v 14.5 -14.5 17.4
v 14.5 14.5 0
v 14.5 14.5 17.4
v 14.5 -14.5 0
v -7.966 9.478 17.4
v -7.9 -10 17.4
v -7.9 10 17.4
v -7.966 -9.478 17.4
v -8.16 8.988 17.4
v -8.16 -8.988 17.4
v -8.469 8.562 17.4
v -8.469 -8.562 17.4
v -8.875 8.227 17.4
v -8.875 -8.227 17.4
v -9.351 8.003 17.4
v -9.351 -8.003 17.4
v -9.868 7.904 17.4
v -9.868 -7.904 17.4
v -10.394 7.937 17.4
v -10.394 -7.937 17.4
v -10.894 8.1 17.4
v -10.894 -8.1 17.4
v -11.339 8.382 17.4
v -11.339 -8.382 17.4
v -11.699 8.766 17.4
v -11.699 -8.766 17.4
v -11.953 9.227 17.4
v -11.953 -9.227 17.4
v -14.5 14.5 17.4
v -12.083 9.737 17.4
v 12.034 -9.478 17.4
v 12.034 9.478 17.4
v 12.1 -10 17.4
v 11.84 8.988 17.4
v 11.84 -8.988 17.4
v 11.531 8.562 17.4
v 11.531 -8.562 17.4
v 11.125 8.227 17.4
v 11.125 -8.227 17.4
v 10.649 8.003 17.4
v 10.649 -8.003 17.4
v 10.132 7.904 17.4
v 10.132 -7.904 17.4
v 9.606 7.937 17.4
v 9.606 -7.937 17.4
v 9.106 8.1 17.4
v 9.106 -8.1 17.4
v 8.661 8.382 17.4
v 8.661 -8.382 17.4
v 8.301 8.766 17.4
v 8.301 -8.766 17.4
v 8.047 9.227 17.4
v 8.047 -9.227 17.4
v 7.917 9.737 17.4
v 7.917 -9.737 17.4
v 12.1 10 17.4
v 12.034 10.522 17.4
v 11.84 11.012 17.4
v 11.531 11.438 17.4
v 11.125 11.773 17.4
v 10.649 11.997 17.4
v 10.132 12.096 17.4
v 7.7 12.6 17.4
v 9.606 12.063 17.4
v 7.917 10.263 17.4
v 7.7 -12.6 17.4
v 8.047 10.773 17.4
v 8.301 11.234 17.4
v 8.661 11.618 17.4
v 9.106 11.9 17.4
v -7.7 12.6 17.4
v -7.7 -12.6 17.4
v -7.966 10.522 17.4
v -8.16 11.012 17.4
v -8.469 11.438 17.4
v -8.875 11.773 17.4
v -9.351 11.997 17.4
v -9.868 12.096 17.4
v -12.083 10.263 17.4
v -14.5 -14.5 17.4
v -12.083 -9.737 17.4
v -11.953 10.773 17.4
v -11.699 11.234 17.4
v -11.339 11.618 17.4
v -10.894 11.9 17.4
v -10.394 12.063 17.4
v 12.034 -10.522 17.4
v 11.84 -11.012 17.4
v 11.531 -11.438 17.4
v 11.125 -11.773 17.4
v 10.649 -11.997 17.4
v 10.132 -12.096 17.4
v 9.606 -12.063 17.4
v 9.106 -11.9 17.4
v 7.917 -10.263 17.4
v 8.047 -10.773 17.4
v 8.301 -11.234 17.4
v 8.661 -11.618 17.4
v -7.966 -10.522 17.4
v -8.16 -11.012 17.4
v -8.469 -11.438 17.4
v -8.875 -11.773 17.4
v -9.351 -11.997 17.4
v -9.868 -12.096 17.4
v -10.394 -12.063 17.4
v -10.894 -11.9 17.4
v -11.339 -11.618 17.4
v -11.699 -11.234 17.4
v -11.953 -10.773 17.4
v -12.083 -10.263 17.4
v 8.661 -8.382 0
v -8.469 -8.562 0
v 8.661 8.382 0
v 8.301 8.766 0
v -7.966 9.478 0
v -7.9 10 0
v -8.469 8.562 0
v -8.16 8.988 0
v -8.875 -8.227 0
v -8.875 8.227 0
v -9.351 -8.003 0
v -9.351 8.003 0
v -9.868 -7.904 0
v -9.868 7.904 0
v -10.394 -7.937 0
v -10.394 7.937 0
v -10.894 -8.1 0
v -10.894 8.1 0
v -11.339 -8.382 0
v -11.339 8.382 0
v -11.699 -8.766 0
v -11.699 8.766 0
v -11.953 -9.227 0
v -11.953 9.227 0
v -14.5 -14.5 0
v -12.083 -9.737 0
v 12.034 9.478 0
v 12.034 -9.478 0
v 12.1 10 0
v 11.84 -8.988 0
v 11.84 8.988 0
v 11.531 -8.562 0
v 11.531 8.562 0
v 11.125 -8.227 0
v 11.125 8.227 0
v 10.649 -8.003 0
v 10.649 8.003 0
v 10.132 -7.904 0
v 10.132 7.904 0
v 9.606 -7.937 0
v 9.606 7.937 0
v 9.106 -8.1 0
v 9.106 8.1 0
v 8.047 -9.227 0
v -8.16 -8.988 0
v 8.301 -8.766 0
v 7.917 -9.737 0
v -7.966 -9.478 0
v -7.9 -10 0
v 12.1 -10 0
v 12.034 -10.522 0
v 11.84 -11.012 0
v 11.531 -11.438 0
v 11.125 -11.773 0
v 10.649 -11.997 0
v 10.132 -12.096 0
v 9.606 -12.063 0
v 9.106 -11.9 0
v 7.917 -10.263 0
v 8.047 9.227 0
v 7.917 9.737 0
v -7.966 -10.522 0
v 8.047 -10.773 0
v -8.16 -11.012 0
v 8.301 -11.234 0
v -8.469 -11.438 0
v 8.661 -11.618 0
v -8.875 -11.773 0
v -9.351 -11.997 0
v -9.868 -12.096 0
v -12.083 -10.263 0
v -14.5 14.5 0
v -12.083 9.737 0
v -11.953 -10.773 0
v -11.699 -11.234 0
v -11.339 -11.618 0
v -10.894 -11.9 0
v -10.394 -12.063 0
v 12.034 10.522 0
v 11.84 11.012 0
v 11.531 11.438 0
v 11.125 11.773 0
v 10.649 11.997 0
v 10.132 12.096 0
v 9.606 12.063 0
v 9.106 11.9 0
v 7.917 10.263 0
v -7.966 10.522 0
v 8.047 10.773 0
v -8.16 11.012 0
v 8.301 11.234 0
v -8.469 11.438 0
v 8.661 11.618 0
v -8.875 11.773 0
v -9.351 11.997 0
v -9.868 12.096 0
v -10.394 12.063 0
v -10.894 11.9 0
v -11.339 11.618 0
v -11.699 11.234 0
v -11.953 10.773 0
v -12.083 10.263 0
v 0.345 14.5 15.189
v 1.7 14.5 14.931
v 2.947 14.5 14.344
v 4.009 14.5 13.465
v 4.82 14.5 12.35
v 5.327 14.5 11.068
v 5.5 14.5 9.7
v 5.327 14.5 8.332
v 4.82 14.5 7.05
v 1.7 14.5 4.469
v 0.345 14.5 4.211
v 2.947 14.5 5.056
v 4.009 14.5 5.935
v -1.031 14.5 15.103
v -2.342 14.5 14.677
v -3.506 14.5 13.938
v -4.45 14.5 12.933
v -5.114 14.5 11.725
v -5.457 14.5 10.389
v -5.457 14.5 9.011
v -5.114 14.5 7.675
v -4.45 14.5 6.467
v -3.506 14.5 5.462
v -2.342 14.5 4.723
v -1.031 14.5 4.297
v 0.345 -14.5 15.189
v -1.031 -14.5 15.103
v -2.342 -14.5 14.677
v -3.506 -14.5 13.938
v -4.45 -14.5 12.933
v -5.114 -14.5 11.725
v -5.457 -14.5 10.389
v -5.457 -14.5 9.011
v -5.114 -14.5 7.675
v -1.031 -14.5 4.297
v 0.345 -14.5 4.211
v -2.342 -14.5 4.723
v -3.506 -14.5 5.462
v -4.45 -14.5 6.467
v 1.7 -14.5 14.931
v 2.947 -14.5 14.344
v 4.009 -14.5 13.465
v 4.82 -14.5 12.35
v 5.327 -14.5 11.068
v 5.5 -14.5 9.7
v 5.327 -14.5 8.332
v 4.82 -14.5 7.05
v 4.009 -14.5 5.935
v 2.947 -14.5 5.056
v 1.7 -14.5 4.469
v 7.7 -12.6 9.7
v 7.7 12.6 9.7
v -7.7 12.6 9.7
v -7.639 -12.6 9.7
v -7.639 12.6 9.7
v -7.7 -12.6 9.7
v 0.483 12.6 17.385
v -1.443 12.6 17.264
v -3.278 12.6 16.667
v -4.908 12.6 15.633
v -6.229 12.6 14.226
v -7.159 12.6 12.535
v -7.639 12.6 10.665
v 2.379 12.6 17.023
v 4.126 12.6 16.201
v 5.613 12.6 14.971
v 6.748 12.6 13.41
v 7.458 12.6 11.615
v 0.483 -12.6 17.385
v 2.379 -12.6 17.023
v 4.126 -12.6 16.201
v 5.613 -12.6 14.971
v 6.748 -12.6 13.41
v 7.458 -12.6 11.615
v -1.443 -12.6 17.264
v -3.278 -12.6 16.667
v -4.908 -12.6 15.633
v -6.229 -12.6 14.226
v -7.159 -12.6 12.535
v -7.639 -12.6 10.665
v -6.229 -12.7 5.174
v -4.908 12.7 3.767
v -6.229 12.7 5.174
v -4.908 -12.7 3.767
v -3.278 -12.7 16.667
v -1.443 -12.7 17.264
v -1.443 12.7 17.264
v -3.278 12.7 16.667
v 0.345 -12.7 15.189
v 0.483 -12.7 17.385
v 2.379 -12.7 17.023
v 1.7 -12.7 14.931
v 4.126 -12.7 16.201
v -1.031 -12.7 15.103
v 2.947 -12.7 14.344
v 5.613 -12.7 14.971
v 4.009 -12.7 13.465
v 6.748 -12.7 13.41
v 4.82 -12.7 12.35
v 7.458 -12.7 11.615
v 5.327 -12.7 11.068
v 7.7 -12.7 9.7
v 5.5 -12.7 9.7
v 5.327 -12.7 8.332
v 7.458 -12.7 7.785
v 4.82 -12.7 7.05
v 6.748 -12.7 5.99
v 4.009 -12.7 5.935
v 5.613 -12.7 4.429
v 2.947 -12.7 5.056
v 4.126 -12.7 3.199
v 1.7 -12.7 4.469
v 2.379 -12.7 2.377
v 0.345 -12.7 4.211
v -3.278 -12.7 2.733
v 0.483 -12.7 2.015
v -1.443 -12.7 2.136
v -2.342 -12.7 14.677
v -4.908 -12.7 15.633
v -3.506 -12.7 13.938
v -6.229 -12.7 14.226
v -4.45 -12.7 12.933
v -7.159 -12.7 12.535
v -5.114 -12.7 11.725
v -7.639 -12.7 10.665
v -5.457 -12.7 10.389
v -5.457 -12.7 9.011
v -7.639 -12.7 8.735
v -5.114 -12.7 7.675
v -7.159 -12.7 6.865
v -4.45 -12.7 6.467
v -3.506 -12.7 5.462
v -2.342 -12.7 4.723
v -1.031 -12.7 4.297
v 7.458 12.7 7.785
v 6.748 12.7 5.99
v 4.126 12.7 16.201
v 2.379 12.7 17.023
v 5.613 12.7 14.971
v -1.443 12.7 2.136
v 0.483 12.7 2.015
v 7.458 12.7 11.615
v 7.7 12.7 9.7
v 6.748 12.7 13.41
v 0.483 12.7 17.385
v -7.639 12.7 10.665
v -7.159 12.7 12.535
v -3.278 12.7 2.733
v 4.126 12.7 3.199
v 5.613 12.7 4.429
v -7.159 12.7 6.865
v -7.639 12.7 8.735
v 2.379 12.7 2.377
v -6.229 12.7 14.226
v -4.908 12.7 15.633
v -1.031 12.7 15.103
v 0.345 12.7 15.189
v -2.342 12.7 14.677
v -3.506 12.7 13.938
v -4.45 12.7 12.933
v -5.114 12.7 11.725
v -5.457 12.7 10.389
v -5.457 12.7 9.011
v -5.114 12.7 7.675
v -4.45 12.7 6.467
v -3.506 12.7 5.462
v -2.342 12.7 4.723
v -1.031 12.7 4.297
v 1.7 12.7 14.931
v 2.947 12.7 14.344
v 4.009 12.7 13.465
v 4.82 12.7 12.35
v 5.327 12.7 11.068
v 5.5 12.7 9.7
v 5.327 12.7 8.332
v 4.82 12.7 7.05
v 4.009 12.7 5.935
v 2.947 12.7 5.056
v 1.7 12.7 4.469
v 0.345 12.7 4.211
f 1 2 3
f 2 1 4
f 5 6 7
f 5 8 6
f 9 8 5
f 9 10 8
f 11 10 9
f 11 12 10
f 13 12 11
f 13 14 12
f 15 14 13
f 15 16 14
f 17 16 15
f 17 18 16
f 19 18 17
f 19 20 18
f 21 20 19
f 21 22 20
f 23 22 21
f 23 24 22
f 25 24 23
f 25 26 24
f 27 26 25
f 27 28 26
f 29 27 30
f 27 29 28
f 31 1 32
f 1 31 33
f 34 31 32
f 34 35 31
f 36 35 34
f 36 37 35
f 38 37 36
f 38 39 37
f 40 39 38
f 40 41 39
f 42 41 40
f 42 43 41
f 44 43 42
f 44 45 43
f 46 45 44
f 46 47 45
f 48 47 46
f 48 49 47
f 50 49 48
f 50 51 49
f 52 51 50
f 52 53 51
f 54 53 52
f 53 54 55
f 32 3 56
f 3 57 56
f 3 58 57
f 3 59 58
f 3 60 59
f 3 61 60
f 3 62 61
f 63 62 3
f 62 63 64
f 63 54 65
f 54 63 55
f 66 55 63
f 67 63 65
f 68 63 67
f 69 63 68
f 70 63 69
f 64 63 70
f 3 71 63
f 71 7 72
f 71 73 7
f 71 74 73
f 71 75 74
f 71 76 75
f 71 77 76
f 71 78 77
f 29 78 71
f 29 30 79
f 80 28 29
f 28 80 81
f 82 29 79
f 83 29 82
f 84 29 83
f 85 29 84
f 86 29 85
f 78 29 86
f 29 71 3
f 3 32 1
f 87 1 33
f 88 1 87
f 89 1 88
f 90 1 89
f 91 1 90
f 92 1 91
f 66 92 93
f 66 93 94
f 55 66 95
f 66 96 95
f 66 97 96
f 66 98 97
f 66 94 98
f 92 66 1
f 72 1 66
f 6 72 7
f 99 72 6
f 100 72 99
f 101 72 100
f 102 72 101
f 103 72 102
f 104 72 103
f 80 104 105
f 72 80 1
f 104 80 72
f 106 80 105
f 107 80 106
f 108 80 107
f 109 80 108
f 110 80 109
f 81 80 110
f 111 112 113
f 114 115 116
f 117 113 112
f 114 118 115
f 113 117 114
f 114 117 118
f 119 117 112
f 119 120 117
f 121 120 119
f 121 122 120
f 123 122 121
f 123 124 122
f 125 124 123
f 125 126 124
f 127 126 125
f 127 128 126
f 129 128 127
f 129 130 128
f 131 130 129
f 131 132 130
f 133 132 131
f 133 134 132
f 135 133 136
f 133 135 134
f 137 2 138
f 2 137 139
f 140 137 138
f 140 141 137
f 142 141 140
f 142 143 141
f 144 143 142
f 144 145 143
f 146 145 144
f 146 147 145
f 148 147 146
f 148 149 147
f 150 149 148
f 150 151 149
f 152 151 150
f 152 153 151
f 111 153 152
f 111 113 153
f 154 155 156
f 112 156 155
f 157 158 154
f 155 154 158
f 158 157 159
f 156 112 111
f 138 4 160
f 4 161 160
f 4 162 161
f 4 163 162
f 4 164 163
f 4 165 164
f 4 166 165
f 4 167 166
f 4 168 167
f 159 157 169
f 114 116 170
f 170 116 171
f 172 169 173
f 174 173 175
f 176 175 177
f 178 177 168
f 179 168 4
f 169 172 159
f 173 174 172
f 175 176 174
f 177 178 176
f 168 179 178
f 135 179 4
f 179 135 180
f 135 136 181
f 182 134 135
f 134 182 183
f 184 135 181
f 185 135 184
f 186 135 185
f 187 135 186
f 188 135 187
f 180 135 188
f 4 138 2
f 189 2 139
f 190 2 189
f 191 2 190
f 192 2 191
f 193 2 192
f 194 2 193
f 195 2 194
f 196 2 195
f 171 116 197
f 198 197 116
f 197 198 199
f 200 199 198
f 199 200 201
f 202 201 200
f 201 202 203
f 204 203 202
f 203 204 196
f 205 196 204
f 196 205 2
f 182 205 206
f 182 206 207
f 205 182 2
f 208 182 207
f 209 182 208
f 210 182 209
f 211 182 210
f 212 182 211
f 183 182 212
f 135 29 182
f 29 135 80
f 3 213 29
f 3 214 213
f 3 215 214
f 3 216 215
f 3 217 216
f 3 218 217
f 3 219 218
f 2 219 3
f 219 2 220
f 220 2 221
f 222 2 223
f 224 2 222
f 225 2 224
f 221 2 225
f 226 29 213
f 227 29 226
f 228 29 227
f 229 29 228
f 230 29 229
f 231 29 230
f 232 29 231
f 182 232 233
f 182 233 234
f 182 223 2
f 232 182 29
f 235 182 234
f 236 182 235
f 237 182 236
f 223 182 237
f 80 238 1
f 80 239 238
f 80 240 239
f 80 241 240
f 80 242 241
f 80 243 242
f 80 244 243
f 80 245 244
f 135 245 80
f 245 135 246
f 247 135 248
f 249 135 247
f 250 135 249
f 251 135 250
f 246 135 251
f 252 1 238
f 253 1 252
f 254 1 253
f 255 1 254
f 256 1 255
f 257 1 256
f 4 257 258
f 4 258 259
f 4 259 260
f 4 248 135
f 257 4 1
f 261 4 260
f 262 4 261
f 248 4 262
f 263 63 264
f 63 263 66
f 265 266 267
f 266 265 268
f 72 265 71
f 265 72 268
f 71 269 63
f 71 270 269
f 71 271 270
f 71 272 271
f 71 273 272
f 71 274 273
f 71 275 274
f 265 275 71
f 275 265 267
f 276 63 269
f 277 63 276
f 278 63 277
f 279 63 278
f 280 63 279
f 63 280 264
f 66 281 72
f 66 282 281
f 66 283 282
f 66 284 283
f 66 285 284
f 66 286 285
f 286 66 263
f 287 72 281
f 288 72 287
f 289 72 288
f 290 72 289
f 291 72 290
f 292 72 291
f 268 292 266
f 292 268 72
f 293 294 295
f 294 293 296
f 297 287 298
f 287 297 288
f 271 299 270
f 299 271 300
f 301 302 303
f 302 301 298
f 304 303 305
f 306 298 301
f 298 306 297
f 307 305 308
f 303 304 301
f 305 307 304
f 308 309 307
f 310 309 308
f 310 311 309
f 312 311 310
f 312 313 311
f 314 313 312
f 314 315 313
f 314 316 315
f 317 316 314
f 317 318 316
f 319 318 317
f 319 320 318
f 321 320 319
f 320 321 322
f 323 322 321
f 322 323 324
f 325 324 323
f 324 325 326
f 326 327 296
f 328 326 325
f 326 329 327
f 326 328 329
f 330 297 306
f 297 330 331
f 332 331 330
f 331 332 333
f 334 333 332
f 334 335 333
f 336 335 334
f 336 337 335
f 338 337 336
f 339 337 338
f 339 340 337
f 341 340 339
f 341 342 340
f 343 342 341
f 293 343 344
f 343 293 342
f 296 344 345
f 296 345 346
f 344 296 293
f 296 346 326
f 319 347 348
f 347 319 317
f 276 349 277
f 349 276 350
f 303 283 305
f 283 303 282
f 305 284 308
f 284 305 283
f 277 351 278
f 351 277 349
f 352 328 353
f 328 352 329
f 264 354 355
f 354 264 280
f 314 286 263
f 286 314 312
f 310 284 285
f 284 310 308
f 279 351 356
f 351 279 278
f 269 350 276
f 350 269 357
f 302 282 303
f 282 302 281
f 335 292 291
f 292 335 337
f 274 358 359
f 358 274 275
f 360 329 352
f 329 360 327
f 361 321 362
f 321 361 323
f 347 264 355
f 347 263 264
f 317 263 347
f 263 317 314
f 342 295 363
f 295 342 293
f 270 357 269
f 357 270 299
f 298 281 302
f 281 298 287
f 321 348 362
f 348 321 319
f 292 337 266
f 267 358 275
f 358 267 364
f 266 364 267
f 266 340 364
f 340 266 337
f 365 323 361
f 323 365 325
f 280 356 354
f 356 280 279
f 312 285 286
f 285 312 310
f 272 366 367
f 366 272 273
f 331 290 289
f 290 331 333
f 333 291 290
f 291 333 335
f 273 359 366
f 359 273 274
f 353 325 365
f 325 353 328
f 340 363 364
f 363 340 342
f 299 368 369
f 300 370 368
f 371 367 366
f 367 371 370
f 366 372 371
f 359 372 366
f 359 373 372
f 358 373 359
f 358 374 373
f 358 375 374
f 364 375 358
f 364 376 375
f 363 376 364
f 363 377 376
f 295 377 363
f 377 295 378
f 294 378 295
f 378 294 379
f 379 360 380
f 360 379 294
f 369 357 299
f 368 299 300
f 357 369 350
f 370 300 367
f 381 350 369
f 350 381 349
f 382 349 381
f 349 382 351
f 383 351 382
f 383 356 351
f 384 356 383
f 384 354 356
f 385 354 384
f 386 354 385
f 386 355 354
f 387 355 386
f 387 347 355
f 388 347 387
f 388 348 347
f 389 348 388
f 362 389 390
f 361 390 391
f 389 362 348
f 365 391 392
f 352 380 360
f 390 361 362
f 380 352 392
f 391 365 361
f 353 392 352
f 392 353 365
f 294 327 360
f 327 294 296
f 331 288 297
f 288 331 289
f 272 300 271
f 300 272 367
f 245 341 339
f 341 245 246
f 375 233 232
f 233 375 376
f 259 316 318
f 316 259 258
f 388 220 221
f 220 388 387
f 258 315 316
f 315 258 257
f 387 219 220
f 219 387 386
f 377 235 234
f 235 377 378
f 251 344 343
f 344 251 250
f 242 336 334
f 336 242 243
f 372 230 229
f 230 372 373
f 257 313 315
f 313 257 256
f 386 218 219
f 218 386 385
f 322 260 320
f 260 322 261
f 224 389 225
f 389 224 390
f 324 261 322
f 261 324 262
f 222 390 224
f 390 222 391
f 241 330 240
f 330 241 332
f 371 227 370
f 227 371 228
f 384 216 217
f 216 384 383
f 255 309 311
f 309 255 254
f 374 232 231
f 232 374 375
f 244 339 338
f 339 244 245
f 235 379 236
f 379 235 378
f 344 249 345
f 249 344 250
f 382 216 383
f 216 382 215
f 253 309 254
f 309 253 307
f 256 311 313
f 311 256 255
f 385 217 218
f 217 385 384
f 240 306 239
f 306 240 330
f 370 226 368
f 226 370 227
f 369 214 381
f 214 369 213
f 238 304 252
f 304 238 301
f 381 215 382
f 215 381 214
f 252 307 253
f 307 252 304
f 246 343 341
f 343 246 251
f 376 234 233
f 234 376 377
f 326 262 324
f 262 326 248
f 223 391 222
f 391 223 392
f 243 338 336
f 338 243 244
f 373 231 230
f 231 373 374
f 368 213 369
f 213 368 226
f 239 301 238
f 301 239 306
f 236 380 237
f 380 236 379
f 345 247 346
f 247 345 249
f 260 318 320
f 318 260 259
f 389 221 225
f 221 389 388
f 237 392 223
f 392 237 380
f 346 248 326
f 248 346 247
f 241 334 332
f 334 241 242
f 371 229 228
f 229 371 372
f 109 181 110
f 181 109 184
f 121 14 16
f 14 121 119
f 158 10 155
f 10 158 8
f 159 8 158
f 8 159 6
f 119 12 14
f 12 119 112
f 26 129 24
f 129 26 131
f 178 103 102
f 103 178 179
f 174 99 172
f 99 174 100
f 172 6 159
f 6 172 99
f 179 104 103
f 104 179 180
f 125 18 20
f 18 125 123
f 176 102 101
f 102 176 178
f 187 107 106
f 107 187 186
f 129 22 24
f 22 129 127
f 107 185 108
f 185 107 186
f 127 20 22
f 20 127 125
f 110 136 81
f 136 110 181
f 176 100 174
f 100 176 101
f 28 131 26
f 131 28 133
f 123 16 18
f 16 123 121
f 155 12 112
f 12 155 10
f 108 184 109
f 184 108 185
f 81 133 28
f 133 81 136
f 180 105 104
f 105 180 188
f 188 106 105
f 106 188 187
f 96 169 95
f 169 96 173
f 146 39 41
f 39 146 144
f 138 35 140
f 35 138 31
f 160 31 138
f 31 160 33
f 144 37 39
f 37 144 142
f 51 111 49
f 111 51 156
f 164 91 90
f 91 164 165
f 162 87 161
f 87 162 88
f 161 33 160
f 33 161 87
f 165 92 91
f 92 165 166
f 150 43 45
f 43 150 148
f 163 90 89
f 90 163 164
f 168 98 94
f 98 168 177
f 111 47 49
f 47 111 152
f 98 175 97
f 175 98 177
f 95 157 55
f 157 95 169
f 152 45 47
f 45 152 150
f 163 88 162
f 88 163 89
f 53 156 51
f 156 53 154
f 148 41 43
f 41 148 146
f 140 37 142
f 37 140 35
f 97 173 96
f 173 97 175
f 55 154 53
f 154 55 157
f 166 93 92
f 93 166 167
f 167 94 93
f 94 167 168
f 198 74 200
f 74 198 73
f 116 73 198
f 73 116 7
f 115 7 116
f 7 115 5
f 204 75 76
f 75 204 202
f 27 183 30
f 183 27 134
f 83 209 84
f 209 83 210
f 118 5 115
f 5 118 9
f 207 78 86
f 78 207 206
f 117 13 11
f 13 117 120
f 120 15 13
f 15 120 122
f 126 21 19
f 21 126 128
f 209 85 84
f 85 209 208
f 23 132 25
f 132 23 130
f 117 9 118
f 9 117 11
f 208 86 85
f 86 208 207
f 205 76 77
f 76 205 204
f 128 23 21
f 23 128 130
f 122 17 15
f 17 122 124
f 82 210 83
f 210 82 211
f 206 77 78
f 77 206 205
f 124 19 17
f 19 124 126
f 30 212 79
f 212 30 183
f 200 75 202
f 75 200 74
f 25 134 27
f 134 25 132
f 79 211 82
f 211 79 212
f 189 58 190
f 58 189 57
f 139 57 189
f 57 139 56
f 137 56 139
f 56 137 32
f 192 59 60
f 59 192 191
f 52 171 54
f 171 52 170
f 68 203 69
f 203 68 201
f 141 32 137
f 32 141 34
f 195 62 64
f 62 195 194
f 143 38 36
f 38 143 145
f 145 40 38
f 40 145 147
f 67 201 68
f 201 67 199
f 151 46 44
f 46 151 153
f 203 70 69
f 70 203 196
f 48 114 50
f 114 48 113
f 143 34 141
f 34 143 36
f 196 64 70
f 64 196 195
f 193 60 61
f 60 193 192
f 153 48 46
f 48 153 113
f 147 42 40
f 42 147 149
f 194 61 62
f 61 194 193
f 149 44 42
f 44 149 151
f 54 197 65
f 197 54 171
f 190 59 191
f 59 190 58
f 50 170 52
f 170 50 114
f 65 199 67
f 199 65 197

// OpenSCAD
// holder for linear bearing D_in=8mm, D_out=15mm, L=25mm. 2-Side mounting
d_in   =  8.0;   // inner diameter
d_out  = 15.0;   // outer diameter
L_bear = 25.0;  // bearing length (Y)

r_out  = d_out / 2 + 0.2;
r_in   = d_in  / 2 + 1.5;
r_h    = 4.0   / 2 + 0.1;   // mounting hole

x_w    = 3.0;   // misc walls
y_w    = 2.0;   //
z_w    = 2.0;   //

x_a =  d_out + 2 * 4.0 + 2 * x_w;
y_a = L_bear + 2 * y_w;
z_a = d_out  + 1 * z_w + 0.4;

x_c = x_a / 2;
y_c = y_a / 2;
z_c = r_out + z_w;

$fn=25;


module lbe_ho_8x25_2side()
{
  difference() {
    translate([ -x_c,-y_c,0]) cube( [x_a,y_a,z_a] );
    // place for bearing
    translate([ -r_out,-0.1-L_bear/2,z_c]) cube( [2*r_out,L_bear+0.2,z_c] );
    translate([ 0,-0.2-L_bear/2,z_c]) rotate([-90,0,0]) cylinder( r=r_out, h=L_bear+0.4 );
    translate([ 0,-y_c,z_c]) rotate([-90,0,0]) cylinder( r=r_in, h=x_a );
    // mounting holes
    translate([ -10,-10,0]) cylinder( r=r_h, h=z_a );
    translate([  10,-10,0]) cylinder( r=r_h, h=z_a );
    translate([ -10, 10,0]) cylinder( r=r_h, h=z_a );
    translate([  10, 10,0]) cylinder( r=r_h, h=z_a );
    
  }
}

// translate([ 40,0,0]) cube( [1,5,1] );
lbe_ho_8x25_2side();
echo( "x_a= ", x_a, "y_a= ", y_a, "z_a= ", z_a );
